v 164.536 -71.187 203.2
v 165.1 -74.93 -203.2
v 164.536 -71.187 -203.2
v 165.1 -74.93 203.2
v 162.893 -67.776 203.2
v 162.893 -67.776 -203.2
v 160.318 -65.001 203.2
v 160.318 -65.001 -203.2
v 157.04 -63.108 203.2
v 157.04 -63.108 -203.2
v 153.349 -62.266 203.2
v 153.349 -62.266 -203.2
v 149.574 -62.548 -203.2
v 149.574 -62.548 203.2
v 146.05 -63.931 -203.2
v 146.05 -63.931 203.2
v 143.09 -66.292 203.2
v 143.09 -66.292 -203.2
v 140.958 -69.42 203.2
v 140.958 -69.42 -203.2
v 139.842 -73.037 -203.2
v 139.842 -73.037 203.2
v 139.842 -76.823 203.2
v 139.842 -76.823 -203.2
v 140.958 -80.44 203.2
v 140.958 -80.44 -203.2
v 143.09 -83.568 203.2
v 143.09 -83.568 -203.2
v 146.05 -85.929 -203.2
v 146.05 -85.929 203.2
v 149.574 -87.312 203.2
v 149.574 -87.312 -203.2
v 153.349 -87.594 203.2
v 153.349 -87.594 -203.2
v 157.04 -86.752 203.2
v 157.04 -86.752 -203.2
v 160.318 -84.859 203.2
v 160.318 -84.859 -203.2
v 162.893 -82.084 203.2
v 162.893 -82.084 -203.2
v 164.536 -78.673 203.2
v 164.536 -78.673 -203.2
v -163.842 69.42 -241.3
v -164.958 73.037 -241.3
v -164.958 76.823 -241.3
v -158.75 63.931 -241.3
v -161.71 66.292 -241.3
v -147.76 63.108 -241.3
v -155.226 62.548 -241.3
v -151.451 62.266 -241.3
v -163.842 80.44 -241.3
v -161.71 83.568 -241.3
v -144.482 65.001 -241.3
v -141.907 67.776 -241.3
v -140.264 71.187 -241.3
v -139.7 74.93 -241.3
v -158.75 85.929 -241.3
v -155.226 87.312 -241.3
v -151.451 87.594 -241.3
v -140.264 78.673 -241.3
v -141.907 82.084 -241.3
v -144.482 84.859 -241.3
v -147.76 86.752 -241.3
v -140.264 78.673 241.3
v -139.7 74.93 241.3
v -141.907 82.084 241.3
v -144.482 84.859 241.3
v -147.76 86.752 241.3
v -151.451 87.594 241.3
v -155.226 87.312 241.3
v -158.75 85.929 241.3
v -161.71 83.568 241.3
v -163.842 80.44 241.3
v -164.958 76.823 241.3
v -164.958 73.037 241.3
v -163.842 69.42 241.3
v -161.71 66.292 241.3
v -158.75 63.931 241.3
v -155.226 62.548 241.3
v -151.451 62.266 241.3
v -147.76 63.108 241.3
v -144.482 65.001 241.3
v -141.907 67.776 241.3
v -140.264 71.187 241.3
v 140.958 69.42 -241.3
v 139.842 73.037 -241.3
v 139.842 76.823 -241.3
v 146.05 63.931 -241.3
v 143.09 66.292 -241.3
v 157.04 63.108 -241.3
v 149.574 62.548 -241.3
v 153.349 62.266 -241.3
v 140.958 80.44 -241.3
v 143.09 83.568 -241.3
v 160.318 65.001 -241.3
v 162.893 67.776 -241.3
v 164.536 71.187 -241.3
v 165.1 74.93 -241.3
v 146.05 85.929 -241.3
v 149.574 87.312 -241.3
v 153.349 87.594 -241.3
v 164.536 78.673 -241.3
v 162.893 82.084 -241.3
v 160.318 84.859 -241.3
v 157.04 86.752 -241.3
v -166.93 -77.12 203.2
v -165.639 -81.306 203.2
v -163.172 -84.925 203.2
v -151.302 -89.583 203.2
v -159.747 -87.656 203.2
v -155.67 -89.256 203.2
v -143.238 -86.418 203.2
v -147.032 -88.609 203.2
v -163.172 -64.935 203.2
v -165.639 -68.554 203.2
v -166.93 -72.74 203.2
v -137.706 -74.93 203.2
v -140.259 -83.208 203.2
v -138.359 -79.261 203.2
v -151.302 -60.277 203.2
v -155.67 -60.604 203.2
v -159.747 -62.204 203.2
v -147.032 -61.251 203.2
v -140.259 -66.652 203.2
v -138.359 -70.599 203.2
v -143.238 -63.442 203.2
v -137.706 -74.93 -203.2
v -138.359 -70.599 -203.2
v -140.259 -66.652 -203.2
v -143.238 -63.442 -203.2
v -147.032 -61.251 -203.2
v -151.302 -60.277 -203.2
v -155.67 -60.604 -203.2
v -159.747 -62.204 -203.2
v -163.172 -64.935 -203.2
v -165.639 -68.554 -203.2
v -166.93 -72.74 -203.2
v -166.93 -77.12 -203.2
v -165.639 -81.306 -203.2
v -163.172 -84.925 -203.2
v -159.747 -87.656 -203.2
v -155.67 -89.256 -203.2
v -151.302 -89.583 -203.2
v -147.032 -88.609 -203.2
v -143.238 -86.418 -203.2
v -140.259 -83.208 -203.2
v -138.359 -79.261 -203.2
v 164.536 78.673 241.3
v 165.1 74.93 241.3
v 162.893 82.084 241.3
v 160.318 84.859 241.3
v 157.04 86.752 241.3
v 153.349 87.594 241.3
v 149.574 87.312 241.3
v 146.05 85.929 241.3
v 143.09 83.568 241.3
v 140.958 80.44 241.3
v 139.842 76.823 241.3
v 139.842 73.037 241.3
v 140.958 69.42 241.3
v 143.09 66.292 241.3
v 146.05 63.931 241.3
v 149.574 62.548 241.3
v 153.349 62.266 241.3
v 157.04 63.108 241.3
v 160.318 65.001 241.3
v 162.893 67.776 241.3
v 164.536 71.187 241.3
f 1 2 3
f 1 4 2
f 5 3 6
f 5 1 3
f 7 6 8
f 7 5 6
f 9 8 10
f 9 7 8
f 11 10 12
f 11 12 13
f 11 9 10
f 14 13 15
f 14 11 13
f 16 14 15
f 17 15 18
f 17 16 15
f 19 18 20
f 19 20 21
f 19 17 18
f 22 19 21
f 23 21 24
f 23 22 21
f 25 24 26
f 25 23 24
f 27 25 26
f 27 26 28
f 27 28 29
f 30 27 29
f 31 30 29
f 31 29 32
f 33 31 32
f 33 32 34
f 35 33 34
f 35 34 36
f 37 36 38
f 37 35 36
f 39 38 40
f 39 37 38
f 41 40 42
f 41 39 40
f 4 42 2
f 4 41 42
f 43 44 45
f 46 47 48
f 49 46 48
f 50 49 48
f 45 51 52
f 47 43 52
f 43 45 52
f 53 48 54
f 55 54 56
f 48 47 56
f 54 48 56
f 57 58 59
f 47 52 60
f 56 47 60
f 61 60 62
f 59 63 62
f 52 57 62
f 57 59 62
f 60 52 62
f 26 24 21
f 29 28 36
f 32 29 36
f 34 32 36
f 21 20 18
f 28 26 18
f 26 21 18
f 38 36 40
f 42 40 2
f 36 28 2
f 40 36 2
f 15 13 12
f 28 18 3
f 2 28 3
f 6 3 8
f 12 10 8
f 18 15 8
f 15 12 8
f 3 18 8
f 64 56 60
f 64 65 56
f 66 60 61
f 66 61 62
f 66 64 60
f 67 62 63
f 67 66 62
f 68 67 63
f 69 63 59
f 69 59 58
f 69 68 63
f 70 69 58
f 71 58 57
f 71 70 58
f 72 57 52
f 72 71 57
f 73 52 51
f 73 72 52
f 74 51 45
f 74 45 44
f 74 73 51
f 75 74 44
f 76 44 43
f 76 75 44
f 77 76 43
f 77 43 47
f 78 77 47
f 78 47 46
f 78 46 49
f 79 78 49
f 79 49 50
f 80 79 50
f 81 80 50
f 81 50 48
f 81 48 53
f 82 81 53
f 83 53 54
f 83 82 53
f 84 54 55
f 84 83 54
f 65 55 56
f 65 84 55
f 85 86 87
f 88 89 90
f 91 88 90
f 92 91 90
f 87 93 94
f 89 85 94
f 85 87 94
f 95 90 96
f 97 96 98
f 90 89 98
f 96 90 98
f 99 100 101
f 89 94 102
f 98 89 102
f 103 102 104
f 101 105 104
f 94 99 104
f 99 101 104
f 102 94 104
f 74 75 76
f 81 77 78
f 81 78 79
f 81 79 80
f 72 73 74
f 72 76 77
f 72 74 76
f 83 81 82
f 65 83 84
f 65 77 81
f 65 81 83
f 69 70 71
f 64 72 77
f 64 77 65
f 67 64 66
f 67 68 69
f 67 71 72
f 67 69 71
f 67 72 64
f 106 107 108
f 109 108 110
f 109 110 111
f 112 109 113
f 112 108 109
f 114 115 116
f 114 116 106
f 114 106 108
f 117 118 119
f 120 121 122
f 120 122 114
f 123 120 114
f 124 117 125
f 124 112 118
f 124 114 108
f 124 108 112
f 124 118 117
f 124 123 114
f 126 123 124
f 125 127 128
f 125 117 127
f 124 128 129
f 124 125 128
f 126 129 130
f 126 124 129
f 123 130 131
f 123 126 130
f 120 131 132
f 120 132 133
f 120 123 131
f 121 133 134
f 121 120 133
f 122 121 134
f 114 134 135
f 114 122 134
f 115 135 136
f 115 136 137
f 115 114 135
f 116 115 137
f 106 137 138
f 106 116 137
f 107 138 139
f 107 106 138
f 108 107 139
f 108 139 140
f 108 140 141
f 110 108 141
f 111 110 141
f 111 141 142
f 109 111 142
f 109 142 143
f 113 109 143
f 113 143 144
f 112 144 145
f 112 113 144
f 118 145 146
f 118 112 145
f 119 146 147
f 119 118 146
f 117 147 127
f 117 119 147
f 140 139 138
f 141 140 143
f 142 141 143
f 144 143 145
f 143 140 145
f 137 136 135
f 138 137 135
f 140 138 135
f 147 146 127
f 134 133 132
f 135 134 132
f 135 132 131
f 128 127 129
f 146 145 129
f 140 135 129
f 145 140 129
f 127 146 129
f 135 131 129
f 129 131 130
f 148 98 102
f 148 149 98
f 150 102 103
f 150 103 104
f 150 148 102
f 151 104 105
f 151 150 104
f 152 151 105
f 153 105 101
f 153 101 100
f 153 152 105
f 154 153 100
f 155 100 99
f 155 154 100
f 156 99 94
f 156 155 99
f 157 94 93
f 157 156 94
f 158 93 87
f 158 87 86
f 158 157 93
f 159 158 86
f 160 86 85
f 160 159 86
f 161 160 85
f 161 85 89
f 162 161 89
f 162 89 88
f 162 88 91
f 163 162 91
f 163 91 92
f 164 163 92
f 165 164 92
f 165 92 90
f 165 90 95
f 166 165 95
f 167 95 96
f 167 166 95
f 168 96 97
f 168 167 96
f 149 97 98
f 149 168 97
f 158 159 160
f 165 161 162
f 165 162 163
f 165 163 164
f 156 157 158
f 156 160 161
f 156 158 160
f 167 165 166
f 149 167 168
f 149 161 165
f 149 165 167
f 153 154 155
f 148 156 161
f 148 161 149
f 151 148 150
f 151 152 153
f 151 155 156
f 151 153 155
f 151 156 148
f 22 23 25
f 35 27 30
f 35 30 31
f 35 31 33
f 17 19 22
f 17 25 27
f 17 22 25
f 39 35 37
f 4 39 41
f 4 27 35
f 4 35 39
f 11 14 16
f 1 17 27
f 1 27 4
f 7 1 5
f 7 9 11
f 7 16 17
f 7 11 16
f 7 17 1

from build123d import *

# Parameters (mm, degrees)
BOSS_EXTRUDE1_DEPTH        = 203.2
BOSS_EXTRUDE1_DEPTH_BACK   = 203.2
SKETCH1_R                  = 12.7
BOSS_EXTRUDE1_2_DEPTH      = 203.2
BOSS_EXTRUDE1_2_DEPTH_BACK = 203.2
SKETCH1_R_2                = 14.694266488
BOSS_EXTRUDE2_DEPTH        = 241.3
BOSS_EXTRUDE2_DEPTH_BACK   = 241.3
SKETCH1_3_R                = 12.7
BOSS_EXTRUDE2_2_DEPTH      = 241.3
BOSS_EXTRUDE2_2_DEPTH_BACK = 241.3


with BuildPart() as part:
    # Sketch1 → Boss-Extrude1 (new, two sides: drawn at the far end of the back side and taken through both)
    with BuildSketch(Plane.XY.offset(-BOSS_EXTRUDE1_DEPTH_BACK)):
        with Locations((152.4, -74.93)):
            Circle(SKETCH1_R)
    extrude(amount=BOSS_EXTRUDE1_DEPTH + BOSS_EXTRUDE1_DEPTH_BACK)


with BuildPart() as body_2:
    # Sketch1 → Boss-Extrude1 2 (new, two sides: drawn at the far end of the back side and taken through both)
    with BuildSketch(Plane.XY.offset(-BOSS_EXTRUDE1_2_DEPTH_BACK)):
        with Locations((-152.4, -74.93)):
            Circle(SKETCH1_R_2)
    extrude(amount=BOSS_EXTRUDE1_2_DEPTH + BOSS_EXTRUDE1_2_DEPTH_BACK)


with BuildPart() as body_3:
    # Sketch1<3> → Boss-Extrude2 (new, two sides: drawn at the far end of the back side and taken through both)
    with BuildSketch(Plane.XY.offset(-BOSS_EXTRUDE2_DEPTH_BACK)):
        with Locations((-152.4, 74.93)):
            Circle(SKETCH1_3_R)
    extrude(amount=BOSS_EXTRUDE2_DEPTH + BOSS_EXTRUDE2_DEPTH_BACK)


with BuildPart() as body_4:
    # Sketch1<3> → Boss-Extrude2 2 (new, two sides: drawn at the far end of the back side and taken through both)
    with BuildSketch(Plane.XY.offset(-BOSS_EXTRUDE2_2_DEPTH_BACK)):
        with Locations((152.4, 74.93)):
            Circle(SKETCH1_3_R)
    extrude(amount=BOSS_EXTRUDE2_2_DEPTH + BOSS_EXTRUDE2_2_DEPTH_BACK)


solid = Compound([part.part, body_2.part, body_3.part, body_4.part])
